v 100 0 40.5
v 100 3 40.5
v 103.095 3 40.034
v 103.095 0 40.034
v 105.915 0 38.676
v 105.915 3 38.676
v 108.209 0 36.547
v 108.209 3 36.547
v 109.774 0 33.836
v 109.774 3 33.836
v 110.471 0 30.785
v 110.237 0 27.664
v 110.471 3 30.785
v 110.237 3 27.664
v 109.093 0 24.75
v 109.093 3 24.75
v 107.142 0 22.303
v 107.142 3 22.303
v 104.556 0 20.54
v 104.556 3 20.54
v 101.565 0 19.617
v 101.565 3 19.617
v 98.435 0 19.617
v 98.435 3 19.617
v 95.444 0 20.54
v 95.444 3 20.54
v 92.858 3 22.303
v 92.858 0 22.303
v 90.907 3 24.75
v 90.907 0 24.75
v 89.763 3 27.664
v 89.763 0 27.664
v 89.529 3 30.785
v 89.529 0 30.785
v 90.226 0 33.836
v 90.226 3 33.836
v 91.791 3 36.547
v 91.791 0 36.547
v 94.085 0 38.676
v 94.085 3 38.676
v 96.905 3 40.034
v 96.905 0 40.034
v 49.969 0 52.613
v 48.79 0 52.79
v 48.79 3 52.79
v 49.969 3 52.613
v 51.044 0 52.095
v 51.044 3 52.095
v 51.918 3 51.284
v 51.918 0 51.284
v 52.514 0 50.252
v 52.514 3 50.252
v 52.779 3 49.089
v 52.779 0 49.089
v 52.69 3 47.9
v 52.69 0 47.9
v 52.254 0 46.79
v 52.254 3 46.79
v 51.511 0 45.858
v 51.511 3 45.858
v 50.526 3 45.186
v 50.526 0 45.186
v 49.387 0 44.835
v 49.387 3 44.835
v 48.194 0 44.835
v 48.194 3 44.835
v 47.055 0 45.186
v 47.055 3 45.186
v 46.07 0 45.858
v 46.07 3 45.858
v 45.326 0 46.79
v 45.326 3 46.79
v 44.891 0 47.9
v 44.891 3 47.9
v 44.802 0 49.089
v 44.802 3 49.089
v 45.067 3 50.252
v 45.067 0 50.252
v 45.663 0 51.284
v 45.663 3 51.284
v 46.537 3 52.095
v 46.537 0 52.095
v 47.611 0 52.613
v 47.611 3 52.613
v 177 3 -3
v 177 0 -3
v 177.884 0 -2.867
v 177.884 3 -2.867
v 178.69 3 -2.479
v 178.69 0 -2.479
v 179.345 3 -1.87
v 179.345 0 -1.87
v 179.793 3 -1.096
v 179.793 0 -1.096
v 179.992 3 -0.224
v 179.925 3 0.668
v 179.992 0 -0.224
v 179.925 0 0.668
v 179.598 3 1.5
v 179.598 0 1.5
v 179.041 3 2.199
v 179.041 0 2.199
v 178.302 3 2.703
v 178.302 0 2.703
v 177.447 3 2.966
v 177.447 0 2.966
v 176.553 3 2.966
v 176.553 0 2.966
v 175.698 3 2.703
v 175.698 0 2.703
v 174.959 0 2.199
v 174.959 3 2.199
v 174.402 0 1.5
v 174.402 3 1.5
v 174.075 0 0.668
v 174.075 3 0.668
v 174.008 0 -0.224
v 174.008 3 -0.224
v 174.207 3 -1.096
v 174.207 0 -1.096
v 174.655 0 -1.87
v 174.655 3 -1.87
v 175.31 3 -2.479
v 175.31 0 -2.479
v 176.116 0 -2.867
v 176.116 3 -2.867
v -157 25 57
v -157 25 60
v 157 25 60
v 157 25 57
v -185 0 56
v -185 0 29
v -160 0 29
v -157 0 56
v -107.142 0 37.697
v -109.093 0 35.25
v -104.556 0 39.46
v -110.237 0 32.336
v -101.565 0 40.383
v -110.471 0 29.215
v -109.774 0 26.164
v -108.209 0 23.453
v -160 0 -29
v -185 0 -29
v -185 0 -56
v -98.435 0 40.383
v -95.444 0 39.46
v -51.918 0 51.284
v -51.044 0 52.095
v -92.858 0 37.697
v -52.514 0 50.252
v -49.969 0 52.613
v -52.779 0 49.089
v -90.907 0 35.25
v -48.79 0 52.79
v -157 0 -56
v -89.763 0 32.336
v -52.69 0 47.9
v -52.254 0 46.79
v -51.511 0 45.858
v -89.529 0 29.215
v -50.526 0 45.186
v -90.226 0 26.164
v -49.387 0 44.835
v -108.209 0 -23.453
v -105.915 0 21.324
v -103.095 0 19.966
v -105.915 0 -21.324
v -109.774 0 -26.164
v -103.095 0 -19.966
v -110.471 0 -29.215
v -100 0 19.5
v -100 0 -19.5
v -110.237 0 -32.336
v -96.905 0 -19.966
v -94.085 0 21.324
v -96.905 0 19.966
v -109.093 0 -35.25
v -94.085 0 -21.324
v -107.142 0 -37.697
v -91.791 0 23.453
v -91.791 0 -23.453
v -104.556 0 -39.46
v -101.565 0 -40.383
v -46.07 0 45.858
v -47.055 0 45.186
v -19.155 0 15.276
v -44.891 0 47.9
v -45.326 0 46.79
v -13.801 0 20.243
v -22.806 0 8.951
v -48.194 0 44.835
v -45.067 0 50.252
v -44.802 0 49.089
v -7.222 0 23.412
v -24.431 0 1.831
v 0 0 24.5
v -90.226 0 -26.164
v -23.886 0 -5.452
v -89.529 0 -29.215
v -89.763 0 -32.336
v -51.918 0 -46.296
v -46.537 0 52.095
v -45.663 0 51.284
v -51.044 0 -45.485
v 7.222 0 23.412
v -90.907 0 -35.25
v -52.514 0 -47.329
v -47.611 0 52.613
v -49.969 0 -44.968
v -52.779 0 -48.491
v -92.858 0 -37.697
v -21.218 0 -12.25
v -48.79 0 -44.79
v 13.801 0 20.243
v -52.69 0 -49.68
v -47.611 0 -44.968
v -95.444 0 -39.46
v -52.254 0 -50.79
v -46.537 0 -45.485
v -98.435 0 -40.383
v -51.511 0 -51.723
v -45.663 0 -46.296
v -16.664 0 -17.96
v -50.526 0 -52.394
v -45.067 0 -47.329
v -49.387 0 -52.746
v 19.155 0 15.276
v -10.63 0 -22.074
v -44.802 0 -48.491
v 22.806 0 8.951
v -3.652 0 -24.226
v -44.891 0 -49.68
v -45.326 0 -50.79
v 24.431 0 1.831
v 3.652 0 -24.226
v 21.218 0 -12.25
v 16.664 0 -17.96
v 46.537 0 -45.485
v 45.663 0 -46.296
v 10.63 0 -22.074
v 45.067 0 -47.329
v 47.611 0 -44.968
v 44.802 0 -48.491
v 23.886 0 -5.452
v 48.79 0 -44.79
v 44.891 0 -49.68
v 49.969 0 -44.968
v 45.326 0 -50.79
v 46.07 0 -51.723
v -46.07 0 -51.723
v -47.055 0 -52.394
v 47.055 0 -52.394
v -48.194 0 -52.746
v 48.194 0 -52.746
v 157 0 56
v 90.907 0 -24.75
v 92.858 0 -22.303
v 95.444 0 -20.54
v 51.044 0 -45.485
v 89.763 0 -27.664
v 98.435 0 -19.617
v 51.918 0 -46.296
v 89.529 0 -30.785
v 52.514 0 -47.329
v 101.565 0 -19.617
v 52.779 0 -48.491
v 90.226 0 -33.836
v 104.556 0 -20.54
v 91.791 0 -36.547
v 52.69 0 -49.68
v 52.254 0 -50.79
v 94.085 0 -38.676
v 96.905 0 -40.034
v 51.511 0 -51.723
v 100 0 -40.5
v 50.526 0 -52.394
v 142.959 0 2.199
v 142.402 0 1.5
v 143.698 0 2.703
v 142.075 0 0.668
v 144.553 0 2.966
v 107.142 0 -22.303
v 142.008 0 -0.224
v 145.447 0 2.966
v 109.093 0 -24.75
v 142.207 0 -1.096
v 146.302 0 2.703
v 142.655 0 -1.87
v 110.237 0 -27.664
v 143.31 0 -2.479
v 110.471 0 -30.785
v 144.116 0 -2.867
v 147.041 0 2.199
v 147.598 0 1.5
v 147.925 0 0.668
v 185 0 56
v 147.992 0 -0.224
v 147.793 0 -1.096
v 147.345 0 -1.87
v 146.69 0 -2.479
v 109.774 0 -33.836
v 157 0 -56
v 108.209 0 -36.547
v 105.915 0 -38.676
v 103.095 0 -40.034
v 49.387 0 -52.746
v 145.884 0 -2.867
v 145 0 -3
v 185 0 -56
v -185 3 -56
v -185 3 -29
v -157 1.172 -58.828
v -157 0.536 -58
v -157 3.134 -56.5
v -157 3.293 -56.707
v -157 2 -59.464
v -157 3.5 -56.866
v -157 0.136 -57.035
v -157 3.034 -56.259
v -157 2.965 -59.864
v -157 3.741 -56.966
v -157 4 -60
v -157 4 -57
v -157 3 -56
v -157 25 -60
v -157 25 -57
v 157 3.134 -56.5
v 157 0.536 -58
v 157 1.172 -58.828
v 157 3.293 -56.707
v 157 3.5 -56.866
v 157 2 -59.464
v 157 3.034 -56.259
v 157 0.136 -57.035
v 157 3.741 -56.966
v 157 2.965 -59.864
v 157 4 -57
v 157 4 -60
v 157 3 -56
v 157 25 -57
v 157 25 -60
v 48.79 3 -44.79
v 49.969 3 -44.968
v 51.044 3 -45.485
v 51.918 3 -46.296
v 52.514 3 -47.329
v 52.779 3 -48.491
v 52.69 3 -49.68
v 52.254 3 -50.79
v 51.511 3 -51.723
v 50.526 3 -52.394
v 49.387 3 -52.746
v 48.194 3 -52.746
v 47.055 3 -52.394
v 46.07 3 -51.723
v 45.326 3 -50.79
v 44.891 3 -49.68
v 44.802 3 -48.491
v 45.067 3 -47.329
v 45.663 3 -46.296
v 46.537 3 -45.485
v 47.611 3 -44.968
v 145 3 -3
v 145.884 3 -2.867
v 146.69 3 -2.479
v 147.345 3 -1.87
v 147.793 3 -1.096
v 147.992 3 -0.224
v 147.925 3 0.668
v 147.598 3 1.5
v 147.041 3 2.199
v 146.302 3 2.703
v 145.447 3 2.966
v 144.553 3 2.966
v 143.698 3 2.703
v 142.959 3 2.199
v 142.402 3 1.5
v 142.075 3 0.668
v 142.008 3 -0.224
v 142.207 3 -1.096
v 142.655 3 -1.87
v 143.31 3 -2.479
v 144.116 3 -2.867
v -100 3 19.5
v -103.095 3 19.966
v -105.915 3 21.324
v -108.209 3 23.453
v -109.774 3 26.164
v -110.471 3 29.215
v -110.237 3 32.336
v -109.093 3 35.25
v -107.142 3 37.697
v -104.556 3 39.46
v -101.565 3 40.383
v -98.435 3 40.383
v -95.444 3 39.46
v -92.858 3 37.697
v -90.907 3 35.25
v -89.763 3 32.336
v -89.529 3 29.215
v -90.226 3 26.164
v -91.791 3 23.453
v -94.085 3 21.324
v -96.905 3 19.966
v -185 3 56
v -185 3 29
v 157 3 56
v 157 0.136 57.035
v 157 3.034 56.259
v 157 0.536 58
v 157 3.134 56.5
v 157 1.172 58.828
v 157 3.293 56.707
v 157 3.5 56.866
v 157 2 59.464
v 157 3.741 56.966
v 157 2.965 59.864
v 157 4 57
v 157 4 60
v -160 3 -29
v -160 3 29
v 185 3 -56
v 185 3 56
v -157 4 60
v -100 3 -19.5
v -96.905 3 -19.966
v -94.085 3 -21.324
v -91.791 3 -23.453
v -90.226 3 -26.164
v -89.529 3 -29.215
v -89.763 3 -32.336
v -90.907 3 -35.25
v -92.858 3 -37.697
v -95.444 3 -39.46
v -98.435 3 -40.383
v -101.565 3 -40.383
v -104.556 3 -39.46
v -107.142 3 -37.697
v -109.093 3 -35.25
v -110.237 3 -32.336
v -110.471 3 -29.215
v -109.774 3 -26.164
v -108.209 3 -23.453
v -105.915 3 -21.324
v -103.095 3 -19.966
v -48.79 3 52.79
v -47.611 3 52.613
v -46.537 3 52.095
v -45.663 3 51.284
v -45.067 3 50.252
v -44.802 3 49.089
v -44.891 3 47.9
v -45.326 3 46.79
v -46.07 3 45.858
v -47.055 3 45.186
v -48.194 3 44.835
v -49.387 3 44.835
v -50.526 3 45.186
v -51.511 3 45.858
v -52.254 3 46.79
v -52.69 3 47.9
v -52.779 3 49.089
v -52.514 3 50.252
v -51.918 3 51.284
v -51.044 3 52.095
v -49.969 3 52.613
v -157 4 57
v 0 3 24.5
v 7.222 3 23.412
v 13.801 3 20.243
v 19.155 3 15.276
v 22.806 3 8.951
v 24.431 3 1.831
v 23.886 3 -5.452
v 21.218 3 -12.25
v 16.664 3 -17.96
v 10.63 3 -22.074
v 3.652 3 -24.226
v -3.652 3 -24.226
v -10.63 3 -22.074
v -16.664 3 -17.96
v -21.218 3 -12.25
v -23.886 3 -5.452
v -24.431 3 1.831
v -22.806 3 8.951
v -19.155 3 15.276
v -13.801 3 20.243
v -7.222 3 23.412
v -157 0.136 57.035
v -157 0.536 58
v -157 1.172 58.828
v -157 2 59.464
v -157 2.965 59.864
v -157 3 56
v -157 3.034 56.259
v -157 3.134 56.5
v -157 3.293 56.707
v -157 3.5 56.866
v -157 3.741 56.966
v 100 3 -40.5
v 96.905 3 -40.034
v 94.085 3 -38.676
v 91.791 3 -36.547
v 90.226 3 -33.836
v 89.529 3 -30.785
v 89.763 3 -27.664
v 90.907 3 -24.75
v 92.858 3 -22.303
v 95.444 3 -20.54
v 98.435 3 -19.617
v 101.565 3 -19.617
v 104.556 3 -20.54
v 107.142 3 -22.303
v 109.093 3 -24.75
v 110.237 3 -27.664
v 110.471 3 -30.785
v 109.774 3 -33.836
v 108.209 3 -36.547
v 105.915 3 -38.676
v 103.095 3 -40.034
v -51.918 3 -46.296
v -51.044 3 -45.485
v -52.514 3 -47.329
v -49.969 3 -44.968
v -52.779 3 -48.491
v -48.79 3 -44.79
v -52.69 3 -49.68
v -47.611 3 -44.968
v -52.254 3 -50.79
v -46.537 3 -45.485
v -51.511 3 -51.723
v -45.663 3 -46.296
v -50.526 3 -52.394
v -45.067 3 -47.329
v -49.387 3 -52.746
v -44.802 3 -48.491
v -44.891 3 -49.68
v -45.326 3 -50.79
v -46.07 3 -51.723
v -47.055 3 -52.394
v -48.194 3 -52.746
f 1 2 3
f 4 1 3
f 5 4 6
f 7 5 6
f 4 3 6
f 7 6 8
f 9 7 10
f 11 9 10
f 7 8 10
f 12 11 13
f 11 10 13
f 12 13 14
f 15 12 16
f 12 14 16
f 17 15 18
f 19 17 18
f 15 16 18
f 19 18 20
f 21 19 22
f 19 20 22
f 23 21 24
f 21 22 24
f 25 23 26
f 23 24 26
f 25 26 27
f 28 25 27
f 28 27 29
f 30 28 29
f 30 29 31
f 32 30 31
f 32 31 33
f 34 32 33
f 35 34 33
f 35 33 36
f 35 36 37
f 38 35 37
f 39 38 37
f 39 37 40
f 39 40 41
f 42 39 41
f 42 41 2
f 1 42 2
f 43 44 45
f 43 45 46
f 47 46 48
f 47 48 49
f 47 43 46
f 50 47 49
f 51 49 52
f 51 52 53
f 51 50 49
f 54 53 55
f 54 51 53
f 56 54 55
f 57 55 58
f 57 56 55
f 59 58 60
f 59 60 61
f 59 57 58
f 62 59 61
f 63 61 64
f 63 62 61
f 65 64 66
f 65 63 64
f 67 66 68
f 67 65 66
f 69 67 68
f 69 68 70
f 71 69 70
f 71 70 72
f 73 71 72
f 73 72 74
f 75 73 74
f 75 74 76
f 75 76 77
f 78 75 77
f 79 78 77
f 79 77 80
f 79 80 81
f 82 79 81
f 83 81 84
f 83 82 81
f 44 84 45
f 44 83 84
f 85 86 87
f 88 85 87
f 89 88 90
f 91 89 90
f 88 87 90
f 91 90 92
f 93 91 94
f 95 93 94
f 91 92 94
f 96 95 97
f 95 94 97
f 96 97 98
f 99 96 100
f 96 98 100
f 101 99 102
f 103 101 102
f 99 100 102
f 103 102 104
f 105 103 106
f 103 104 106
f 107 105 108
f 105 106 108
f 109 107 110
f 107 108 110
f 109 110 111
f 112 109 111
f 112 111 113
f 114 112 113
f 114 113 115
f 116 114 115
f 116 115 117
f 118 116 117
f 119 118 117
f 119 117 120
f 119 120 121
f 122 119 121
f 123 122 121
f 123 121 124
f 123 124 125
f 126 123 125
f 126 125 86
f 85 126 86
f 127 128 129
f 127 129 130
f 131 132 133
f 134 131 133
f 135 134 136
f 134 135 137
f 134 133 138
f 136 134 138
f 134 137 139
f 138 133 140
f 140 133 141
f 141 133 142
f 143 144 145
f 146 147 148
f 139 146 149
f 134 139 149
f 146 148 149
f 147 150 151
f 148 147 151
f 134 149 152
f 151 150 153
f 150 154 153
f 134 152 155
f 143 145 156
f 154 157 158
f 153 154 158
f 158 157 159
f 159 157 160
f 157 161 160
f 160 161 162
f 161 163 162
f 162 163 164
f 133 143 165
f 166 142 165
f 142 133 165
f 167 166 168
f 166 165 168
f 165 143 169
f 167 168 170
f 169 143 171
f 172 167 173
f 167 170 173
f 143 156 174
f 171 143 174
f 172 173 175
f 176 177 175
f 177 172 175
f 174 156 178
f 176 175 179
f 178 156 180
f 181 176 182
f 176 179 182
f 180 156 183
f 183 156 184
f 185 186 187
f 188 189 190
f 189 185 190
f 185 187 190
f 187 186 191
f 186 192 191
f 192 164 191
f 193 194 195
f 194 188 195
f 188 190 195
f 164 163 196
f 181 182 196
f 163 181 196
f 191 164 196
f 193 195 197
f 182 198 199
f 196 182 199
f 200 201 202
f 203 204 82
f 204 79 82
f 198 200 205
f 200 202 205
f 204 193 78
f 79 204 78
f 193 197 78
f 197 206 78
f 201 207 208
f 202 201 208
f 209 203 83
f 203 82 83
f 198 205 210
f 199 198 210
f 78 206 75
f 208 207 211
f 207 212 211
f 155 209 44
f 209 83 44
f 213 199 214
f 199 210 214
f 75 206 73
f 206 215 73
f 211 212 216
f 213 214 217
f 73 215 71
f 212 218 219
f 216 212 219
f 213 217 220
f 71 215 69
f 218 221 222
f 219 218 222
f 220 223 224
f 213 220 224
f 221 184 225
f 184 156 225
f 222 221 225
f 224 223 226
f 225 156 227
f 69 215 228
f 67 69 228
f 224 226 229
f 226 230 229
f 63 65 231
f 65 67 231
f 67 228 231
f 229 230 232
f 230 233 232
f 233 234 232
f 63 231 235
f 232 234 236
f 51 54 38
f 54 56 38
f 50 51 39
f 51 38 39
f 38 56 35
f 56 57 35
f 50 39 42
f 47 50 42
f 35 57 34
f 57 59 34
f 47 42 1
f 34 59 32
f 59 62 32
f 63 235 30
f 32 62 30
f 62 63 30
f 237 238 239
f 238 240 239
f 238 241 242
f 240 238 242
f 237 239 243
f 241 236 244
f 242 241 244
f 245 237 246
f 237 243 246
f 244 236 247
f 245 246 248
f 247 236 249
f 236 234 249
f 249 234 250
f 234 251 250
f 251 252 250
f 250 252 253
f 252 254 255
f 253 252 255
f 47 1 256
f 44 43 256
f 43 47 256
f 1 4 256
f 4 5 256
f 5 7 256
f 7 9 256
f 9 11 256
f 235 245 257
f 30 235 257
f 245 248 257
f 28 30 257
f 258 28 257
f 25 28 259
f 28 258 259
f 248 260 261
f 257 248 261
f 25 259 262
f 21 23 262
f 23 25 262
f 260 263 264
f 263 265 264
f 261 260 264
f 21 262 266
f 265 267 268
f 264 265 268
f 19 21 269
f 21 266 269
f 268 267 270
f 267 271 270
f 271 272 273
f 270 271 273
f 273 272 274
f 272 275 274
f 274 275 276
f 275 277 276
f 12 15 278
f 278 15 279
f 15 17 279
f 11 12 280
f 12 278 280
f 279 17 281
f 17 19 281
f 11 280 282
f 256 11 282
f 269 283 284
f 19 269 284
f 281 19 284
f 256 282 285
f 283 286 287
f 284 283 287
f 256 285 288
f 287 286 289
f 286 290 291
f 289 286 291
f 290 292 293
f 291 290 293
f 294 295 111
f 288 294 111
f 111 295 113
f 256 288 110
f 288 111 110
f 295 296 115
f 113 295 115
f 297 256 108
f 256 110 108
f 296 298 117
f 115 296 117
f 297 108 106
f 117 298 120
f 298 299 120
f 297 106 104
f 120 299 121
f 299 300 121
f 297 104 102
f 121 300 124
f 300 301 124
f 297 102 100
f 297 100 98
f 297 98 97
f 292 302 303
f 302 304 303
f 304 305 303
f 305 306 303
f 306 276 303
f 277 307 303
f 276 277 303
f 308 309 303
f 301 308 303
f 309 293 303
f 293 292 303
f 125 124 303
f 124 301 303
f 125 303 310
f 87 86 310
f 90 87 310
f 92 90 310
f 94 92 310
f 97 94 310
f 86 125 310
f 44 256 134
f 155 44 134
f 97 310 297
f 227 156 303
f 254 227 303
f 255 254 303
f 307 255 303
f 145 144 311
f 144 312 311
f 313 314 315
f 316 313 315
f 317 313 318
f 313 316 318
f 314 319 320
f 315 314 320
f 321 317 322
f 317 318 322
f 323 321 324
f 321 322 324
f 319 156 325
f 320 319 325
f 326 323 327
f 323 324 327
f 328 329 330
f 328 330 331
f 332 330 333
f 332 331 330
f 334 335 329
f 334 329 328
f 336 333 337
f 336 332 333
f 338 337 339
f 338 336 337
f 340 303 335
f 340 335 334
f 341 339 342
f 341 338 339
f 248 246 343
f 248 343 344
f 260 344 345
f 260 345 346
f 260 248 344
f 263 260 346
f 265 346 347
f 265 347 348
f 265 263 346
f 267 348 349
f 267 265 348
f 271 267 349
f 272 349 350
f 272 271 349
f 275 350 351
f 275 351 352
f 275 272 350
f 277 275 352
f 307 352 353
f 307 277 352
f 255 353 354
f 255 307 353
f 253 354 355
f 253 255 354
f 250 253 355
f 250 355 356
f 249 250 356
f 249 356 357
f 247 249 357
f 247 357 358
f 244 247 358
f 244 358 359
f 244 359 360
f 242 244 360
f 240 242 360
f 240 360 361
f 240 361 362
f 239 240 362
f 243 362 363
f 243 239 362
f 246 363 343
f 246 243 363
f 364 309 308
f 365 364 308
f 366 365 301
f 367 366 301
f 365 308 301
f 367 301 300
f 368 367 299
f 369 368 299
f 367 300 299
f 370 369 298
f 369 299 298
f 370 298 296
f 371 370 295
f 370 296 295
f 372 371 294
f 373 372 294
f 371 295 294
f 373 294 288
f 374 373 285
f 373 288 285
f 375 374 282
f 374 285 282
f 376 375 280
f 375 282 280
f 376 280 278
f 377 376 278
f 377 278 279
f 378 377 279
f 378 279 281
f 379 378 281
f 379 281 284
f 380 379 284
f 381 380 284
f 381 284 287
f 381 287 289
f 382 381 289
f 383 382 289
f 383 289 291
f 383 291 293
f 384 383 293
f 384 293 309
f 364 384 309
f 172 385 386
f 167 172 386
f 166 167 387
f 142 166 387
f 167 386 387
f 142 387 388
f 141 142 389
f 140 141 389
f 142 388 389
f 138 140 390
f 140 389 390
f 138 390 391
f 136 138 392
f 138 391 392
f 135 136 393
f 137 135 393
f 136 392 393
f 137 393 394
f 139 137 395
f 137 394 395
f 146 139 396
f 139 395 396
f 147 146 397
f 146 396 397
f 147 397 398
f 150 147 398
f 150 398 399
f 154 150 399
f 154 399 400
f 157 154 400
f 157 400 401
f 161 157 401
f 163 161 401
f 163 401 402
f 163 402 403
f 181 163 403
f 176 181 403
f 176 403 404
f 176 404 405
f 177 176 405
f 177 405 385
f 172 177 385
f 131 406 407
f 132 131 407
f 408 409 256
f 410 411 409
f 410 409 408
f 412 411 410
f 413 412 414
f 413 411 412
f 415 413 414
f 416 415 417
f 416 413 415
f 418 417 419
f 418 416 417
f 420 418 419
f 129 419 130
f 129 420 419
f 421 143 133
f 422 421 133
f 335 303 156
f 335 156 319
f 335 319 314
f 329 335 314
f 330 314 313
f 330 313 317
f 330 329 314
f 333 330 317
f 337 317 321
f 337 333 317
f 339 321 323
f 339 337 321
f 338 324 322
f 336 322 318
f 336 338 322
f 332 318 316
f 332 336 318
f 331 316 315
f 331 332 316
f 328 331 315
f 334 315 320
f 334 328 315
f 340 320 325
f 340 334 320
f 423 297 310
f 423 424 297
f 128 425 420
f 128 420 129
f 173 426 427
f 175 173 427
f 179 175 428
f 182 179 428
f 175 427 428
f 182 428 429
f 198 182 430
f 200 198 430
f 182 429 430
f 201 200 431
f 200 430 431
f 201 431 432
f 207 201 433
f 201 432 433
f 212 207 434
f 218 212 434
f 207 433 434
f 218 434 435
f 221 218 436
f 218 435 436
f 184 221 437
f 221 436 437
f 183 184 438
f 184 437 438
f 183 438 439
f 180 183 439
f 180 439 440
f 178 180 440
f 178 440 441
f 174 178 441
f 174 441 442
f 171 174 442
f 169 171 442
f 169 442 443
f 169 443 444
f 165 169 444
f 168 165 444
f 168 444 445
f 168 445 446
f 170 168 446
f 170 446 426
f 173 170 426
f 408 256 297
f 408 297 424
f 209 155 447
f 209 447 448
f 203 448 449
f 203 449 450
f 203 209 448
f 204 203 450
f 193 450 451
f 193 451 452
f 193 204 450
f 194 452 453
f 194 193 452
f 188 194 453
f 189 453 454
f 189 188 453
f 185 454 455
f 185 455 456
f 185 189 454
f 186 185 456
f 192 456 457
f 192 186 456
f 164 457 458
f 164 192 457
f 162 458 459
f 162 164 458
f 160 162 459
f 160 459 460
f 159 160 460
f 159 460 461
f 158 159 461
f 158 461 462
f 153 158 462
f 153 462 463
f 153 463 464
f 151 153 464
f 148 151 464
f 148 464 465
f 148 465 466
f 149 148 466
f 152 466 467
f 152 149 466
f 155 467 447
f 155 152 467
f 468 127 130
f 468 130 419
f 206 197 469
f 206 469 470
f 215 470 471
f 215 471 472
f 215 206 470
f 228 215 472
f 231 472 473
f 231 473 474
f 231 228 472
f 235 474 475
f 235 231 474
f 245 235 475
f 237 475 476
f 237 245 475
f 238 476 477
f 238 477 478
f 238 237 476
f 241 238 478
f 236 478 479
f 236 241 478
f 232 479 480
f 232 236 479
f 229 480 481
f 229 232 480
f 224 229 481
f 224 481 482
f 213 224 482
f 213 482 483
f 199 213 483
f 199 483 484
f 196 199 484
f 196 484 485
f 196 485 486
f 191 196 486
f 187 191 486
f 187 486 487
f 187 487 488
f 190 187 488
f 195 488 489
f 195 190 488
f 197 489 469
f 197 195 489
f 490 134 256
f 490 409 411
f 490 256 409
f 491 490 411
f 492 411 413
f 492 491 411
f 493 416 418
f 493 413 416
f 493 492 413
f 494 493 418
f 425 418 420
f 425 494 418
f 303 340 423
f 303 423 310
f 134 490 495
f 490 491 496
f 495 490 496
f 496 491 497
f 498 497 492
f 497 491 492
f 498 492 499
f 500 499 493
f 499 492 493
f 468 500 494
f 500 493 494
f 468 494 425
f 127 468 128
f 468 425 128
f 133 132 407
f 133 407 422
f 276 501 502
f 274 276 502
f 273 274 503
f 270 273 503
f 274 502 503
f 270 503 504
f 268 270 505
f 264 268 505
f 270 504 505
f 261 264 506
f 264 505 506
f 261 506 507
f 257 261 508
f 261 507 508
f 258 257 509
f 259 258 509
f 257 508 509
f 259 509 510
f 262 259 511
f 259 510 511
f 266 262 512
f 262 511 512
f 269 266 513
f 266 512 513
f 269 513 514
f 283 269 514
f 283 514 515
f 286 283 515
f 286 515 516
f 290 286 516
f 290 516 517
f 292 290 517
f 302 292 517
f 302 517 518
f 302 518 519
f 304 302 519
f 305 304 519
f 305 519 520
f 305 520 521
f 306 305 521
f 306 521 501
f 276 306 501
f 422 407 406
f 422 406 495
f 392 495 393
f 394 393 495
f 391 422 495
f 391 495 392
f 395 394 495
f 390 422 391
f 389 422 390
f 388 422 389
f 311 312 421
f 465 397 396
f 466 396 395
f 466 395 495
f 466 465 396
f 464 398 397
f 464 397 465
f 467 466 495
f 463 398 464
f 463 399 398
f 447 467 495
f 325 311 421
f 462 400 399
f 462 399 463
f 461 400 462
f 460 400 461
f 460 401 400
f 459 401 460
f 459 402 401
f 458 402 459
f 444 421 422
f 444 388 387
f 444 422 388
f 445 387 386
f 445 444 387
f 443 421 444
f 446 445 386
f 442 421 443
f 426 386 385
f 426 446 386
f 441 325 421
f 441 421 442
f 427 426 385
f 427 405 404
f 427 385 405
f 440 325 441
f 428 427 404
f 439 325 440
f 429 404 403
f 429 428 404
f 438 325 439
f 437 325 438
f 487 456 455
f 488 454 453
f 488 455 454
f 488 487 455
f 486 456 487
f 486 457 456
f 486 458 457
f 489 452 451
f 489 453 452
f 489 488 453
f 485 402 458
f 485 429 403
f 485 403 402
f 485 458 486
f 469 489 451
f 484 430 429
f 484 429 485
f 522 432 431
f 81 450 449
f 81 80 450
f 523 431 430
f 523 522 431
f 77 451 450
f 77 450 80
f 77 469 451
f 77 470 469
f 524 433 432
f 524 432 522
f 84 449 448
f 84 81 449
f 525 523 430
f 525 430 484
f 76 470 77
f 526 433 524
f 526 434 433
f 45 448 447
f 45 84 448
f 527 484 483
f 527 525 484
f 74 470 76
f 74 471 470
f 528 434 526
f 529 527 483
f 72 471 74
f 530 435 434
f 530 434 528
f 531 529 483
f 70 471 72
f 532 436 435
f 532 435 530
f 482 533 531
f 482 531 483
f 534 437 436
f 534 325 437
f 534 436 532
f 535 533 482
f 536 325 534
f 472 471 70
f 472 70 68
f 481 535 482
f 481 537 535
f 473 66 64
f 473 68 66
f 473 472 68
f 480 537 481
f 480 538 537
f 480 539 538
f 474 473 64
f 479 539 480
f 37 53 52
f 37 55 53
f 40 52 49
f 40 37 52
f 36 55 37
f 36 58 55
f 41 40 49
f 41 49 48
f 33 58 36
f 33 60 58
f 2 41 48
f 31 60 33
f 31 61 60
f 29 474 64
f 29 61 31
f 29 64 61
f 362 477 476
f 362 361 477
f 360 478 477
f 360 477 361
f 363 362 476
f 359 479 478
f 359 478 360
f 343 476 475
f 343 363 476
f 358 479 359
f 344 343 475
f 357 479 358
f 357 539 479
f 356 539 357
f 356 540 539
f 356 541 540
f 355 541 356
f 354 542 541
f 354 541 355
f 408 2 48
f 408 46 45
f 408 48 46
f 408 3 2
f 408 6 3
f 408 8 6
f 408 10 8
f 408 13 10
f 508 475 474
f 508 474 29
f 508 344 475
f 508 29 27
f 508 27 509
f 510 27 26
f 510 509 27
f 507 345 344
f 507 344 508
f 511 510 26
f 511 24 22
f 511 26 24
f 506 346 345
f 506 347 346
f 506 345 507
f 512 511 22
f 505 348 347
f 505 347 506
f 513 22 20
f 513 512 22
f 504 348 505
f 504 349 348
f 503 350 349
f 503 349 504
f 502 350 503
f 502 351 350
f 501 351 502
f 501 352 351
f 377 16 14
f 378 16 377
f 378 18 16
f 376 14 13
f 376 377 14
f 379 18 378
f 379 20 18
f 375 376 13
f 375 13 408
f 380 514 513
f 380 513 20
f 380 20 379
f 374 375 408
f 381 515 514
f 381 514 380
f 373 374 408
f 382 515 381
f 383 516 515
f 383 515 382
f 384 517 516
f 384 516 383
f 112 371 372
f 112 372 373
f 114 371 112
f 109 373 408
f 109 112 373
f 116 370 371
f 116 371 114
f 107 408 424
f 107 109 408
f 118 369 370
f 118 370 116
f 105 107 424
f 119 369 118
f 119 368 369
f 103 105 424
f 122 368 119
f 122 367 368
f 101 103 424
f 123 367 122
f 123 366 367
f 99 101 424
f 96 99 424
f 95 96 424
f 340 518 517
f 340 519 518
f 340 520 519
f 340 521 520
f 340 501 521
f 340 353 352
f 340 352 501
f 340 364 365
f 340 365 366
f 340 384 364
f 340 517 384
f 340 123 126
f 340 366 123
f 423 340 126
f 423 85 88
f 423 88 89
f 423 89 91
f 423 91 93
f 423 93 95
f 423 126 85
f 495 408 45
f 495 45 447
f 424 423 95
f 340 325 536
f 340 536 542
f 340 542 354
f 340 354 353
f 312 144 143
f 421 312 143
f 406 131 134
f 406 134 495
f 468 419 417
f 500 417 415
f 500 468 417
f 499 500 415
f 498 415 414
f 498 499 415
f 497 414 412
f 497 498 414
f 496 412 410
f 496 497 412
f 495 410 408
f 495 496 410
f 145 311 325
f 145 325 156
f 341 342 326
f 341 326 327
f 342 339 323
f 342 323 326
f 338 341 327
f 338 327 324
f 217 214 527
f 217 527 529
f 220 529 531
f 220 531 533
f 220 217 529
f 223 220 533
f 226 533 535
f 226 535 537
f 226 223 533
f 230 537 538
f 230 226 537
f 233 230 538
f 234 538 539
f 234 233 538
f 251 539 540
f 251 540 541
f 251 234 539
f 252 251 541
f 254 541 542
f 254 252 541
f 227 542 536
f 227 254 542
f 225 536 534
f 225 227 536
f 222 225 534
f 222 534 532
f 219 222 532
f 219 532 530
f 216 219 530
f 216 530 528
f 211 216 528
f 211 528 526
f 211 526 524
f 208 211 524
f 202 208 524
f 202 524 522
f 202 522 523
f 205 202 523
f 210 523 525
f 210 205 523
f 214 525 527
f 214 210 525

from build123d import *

# Parameters (mm, degrees)
SKETCH1_W                      = 370
SKETCH1_H                      = 114
SKETCH1_R                      = 4
SKETCH1_R_2                    = 24.5
BOSS_EXTRUDE1_DEPTH            = 3
EDGE_FLANGE1_STRIP_W           = 14
EDGE_FLANGE1_STRIP_H           = 3
EDGE_FLANGE1_STRIP_CUT_DEPTH   = 370
EDGE_FLANGE1_STRIP_2_W         = 14
EDGE_FLANGE1_STRIP_2_H         = 3
EDGE_FLANGE1_STRIP_CUT_2_DEPTH = 370
EDGE_FLANGE1_DEPTH             = 370
EDGE_FLANGE1_BEND_DEPTH        = 370
CUT_EXTRUDE1_REACH             = 198.087
SKETCH16_R                     = 3
SKETCH16_W                     = 25
SKETCH16_H                     = 58
CUT_EXTRUDE2_REACH             = 197.727
SKETCH17_R                     = 10.5
CUT_EXTRUDE3_START             = -185
CUT_EXTRUDE3_DEPTH             = 28
CUT_EXTRUDE3_START_2           = 157
CUT_EXTRUDE3_2_DEPTH           = 28


# Read off the part's stored shape, not the designer's step: Cut-Extrude3
# Sheet-metal steps are written as plain solids
with BuildPart() as part:
    # Sketch1 → Boss-Extrude1 (new body)
    with BuildSketch(Plane(origin=(0, 0, 0), x_dir=(1, 0, 0), z_dir=(0, 1, 0))):
        Rectangle(SKETCH1_W, SKETCH1_H)
        with Locations(Location((-48.790367902, 48.790367902, 0), (0, 0, 270))):
            Circle(SKETCH1_R, mode=Mode.SUBTRACT)
        with Locations(Location((48.790367902, 48.790367902, 0), (0, 0, 270))):
            Circle(SKETCH1_R, mode=Mode.SUBTRACT)
        with Locations(Location((48.790367902, -48.790367902, 0), (0, 0, 270))):
            Circle(SKETCH1_R, mode=Mode.SUBTRACT)
        with Locations(Location((-48.790367902, -48.790367902, 0), (0, 0, 270))):
            Circle(SKETCH1_R, mode=Mode.SUBTRACT)
        with Locations(Location((0, 0, 0), (0, 0, 270))):
            Circle(SKETCH1_R_2, mode=Mode.SUBTRACT)
    extrude(amount=BOSS_EXTRUDE1_DEPTH)

    # Edge-Flange1 strip (across the edge) → Edge-Flange1 strip cut (cut)
    with BuildSketch(Plane(origin=(-185, 3, 57), x_dir=(0, 0, -1), z_dir=(1, 0, 0))):
        with Locations((-6, -1.5)):
            Rectangle(EDGE_FLANGE1_STRIP_W, EDGE_FLANGE1_STRIP_H)
    extrude(amount=EDGE_FLANGE1_STRIP_CUT_DEPTH, mode=Mode.SUBTRACT)

    # Edge-Flange1 strip 2 (across the edge) → Edge-Flange1 strip cut 2 (cut)
    with BuildSketch(Plane(origin=(185, 3, -57), x_dir=(0, 0, 1), z_dir=(-1, 0, 0))):
        with Locations((-6, -1.5)):
            Rectangle(EDGE_FLANGE1_STRIP_2_W, EDGE_FLANGE1_STRIP_2_H)
    extrude(amount=EDGE_FLANGE1_STRIP_CUT_2_DEPTH, mode=Mode.SUBTRACT)

    # Edge-Flange1 section (across the edge) → Edge-Flange1 (add)
    with BuildSketch(Plane(origin=(-185, 3, 57), x_dir=(0, 0, -1), z_dir=(1, 0, 0))):
        with BuildLine():
            Line((-3, 1), (-3, 22))
            Line((-3, 22), (0, 22))
            Line((0, 22), (0, 1))
            ThreePointArc((0, 1), (0.292893219, 0.292893219), (1, 0))
            Line((1, 0), (1, -3))
            ThreePointArc((1, -3), (-1.828427125, -1.828427125), (-3, 1))
        make_face()
    extrude(amount=EDGE_FLANGE1_DEPTH)

    # Edge-Flange1 section 2 (across the edge) → Edge-Flange1 bend (add)
    with BuildSketch(Plane(origin=(185, 3, -57), x_dir=(0, 0, 1), z_dir=(-1, 0, 0))):
        with BuildLine():
            Line((-3, 1), (-3, 22))
            Line((-3, 22), (0, 22))
            Line((0, 22), (0, 1))
            ThreePointArc((0, 1), (0.292893219, 0.292893219), (1, 0))
            Line((1, 0), (1, -3))
            ThreePointArc((1, -3), (-1.828427125, -1.828427125), (-3, 1))
        make_face()
    extrude(amount=EDGE_FLANGE1_BEND_DEPTH)

    # Sketch16 → Cut-Extrude1 (cut, up to next)
    with BuildSketch(Plane.XZ, mode=Mode.PRIVATE) as cut_extrude1_sk1:
        with Locations(Location((177, 0, 0), (0, 0, 270))):
            Circle(SKETCH16_R)
    cut_extrude1_tool1 = extrude(cut_extrude1_sk1.sketch, amount=-CUT_EXTRUDE1_REACH, mode=Mode.PRIVATE) & part.part
    # Sketch16 → Cut-Extrude1 (cut, up to next)
    with BuildSketch(Plane.XZ, mode=Mode.PRIVATE) as cut_extrude1_sk2:
        with Locations(Location((145, 0, 0), (0, 0, 270))):
            Circle(SKETCH16_R)
    cut_extrude1_tool2 = extrude(cut_extrude1_sk2.sketch, amount=-CUT_EXTRUDE1_REACH, mode=Mode.PRIVATE) & part.part
    # Sketch16 → Cut-Extrude1 (cut, up to next)
    with BuildSketch(Plane.XZ, mode=Mode.PRIVATE) as cut_extrude1_sk3:
        with Locations((-172.5, 0)):
            Rectangle(SKETCH16_W, SKETCH16_H)
    cut_extrude1_tool3 = extrude(cut_extrude1_sk3.sketch, amount=-CUT_EXTRUDE1_REACH, mode=Mode.PRIVATE) & part.part
    add(cut_extrude1_tool1.solids().sort_by_distance((177, 0, 0))[0], mode=Mode.SUBTRACT)
    add(cut_extrude1_tool2.solids().sort_by_distance((145, 0, 0))[0], mode=Mode.SUBTRACT)
    add(cut_extrude1_tool3.solids().sort_by_distance((-172.5, 0, 0))[0], mode=Mode.SUBTRACT)

    # Sketch17 → Cut-Extrude2 (cut, up to next)
    with BuildSketch(Plane(origin=(0, 3, 0), x_dir=(1, 0, 0), z_dir=(0, 1, 0)), mode=Mode.PRIVATE) as cut_extrude2_sk1:
        with Locations(Location((-100, 30, 0), (0, 0, 270))):
            Circle(SKETCH17_R)
    cut_extrude2_tool1 = extrude(cut_extrude2_sk1.sketch, amount=-CUT_EXTRUDE2_REACH, mode=Mode.PRIVATE) & part.part
    # Sketch17 → Cut-Extrude2 (cut, up to next)
    with BuildSketch(Plane(origin=(0, 3, 0), x_dir=(1, 0, 0), z_dir=(0, 1, 0)), mode=Mode.PRIVATE) as cut_extrude2_sk2:
        with Locations(Location((100, 30, 0), (0, 0, 90))):
            Circle(SKETCH17_R)
    cut_extrude2_tool2 = extrude(cut_extrude2_sk2.sketch, amount=-CUT_EXTRUDE2_REACH, mode=Mode.PRIVATE) & part.part
    # Sketch17 → Cut-Extrude2 (cut, up to next)
    with BuildSketch(Plane(origin=(0, 3, 0), x_dir=(1, 0, 0), z_dir=(0, 1, 0)), mode=Mode.PRIVATE) as cut_extrude2_sk3:
        with Locations(Location((100, -30, 0), (0, 0, 270))):
            Circle(SKETCH17_R)
    cut_extrude2_tool3 = extrude(cut_extrude2_sk3.sketch, amount=-CUT_EXTRUDE2_REACH, mode=Mode.PRIVATE) & part.part
    # Sketch17 → Cut-Extrude2 (cut, up to next)
    with BuildSketch(Plane(origin=(0, 3, 0), x_dir=(1, 0, 0), z_dir=(0, 1, 0)), mode=Mode.PRIVATE) as cut_extrude2_sk4:
        with Locations(Location((-100, -30, 0), (0, 0, 90))):
            Circle(SKETCH17_R)
    cut_extrude2_tool4 = extrude(cut_extrude2_sk4.sketch, amount=-CUT_EXTRUDE2_REACH, mode=Mode.PRIVATE) & part.part
    add(cut_extrude2_tool1.solids().sort_by_distance((-100, 3, -30))[0], mode=Mode.SUBTRACT)
    add(cut_extrude2_tool2.solids().sort_by_distance((100, 3, -30))[0], mode=Mode.SUBTRACT)
    add(cut_extrude2_tool3.solids().sort_by_distance((100, 3, 30))[0], mode=Mode.SUBTRACT)
    add(cut_extrude2_tool4.solids().sort_by_distance((-100, 3, 30))[0], mode=Mode.SUBTRACT)

    # Cut-Extrude3 outline → Cut-Extrude3 (cut)
    with BuildSketch(Plane.YZ.offset(CUT_EXTRUDE3_START)):
        with BuildLine():
            ThreePointArc((4, -57), (3.292893219, -56.707106781), (3, -56))
            Line((3, -56), (0, -56))
            ThreePointArc((0, -56), (1.171572875, -58.828427125), (4, -60))
            Line((4, -60), (25, -60))
            Line((25, -60), (25, -57))
            Line((25, -57), (4, -57))
        make_face()
        with BuildLine():
            ThreePointArc((4, 60), (1.171572875, 58.828427125), (0, 56))
            Line((0, 56), (3, 56))
            ThreePointArc((3, 56), (3.292893219, 56.707106781), (4, 57))
            Line((4, 57), (25, 57))
            Line((25, 57), (25, 60))
            Line((25, 60), (4, 60))
        make_face()
    extrude(amount=CUT_EXTRUDE3_DEPTH, mode=Mode.SUBTRACT)

    # Cut-Extrude3 2 outline → Cut-Extrude3 2 (cut)
    with BuildSketch(Plane.YZ.offset(CUT_EXTRUDE3_START_2)):
        with BuildLine():
            ThreePointArc((4, -57), (3.292893219, -56.707106781), (3, -56))
            Line((3, -56), (0, -56))
            ThreePointArc((0, -56), (1.171572875, -58.828427125), (4, -60))
            Line((4, -60), (25, -60))
            Line((25, -60), (25, -57))
            Line((25, -57), (4, -57))
        make_face()
        with BuildLine():
            ThreePointArc((4, 60), (1.171572875, 58.828427125), (0, 56))
            Line((0, 56), (3, 56))
            ThreePointArc((3, 56), (3.292893219, 56.707106781), (4, 57))
            Line((4, 57), (25, 57))
            Line((25, 57), (25, 60))
            Line((25, 60), (4, 60))
        make_face()
    extrude(amount=CUT_EXTRUDE3_2_DEPTH, mode=Mode.SUBTRACT)


solid = part.part
